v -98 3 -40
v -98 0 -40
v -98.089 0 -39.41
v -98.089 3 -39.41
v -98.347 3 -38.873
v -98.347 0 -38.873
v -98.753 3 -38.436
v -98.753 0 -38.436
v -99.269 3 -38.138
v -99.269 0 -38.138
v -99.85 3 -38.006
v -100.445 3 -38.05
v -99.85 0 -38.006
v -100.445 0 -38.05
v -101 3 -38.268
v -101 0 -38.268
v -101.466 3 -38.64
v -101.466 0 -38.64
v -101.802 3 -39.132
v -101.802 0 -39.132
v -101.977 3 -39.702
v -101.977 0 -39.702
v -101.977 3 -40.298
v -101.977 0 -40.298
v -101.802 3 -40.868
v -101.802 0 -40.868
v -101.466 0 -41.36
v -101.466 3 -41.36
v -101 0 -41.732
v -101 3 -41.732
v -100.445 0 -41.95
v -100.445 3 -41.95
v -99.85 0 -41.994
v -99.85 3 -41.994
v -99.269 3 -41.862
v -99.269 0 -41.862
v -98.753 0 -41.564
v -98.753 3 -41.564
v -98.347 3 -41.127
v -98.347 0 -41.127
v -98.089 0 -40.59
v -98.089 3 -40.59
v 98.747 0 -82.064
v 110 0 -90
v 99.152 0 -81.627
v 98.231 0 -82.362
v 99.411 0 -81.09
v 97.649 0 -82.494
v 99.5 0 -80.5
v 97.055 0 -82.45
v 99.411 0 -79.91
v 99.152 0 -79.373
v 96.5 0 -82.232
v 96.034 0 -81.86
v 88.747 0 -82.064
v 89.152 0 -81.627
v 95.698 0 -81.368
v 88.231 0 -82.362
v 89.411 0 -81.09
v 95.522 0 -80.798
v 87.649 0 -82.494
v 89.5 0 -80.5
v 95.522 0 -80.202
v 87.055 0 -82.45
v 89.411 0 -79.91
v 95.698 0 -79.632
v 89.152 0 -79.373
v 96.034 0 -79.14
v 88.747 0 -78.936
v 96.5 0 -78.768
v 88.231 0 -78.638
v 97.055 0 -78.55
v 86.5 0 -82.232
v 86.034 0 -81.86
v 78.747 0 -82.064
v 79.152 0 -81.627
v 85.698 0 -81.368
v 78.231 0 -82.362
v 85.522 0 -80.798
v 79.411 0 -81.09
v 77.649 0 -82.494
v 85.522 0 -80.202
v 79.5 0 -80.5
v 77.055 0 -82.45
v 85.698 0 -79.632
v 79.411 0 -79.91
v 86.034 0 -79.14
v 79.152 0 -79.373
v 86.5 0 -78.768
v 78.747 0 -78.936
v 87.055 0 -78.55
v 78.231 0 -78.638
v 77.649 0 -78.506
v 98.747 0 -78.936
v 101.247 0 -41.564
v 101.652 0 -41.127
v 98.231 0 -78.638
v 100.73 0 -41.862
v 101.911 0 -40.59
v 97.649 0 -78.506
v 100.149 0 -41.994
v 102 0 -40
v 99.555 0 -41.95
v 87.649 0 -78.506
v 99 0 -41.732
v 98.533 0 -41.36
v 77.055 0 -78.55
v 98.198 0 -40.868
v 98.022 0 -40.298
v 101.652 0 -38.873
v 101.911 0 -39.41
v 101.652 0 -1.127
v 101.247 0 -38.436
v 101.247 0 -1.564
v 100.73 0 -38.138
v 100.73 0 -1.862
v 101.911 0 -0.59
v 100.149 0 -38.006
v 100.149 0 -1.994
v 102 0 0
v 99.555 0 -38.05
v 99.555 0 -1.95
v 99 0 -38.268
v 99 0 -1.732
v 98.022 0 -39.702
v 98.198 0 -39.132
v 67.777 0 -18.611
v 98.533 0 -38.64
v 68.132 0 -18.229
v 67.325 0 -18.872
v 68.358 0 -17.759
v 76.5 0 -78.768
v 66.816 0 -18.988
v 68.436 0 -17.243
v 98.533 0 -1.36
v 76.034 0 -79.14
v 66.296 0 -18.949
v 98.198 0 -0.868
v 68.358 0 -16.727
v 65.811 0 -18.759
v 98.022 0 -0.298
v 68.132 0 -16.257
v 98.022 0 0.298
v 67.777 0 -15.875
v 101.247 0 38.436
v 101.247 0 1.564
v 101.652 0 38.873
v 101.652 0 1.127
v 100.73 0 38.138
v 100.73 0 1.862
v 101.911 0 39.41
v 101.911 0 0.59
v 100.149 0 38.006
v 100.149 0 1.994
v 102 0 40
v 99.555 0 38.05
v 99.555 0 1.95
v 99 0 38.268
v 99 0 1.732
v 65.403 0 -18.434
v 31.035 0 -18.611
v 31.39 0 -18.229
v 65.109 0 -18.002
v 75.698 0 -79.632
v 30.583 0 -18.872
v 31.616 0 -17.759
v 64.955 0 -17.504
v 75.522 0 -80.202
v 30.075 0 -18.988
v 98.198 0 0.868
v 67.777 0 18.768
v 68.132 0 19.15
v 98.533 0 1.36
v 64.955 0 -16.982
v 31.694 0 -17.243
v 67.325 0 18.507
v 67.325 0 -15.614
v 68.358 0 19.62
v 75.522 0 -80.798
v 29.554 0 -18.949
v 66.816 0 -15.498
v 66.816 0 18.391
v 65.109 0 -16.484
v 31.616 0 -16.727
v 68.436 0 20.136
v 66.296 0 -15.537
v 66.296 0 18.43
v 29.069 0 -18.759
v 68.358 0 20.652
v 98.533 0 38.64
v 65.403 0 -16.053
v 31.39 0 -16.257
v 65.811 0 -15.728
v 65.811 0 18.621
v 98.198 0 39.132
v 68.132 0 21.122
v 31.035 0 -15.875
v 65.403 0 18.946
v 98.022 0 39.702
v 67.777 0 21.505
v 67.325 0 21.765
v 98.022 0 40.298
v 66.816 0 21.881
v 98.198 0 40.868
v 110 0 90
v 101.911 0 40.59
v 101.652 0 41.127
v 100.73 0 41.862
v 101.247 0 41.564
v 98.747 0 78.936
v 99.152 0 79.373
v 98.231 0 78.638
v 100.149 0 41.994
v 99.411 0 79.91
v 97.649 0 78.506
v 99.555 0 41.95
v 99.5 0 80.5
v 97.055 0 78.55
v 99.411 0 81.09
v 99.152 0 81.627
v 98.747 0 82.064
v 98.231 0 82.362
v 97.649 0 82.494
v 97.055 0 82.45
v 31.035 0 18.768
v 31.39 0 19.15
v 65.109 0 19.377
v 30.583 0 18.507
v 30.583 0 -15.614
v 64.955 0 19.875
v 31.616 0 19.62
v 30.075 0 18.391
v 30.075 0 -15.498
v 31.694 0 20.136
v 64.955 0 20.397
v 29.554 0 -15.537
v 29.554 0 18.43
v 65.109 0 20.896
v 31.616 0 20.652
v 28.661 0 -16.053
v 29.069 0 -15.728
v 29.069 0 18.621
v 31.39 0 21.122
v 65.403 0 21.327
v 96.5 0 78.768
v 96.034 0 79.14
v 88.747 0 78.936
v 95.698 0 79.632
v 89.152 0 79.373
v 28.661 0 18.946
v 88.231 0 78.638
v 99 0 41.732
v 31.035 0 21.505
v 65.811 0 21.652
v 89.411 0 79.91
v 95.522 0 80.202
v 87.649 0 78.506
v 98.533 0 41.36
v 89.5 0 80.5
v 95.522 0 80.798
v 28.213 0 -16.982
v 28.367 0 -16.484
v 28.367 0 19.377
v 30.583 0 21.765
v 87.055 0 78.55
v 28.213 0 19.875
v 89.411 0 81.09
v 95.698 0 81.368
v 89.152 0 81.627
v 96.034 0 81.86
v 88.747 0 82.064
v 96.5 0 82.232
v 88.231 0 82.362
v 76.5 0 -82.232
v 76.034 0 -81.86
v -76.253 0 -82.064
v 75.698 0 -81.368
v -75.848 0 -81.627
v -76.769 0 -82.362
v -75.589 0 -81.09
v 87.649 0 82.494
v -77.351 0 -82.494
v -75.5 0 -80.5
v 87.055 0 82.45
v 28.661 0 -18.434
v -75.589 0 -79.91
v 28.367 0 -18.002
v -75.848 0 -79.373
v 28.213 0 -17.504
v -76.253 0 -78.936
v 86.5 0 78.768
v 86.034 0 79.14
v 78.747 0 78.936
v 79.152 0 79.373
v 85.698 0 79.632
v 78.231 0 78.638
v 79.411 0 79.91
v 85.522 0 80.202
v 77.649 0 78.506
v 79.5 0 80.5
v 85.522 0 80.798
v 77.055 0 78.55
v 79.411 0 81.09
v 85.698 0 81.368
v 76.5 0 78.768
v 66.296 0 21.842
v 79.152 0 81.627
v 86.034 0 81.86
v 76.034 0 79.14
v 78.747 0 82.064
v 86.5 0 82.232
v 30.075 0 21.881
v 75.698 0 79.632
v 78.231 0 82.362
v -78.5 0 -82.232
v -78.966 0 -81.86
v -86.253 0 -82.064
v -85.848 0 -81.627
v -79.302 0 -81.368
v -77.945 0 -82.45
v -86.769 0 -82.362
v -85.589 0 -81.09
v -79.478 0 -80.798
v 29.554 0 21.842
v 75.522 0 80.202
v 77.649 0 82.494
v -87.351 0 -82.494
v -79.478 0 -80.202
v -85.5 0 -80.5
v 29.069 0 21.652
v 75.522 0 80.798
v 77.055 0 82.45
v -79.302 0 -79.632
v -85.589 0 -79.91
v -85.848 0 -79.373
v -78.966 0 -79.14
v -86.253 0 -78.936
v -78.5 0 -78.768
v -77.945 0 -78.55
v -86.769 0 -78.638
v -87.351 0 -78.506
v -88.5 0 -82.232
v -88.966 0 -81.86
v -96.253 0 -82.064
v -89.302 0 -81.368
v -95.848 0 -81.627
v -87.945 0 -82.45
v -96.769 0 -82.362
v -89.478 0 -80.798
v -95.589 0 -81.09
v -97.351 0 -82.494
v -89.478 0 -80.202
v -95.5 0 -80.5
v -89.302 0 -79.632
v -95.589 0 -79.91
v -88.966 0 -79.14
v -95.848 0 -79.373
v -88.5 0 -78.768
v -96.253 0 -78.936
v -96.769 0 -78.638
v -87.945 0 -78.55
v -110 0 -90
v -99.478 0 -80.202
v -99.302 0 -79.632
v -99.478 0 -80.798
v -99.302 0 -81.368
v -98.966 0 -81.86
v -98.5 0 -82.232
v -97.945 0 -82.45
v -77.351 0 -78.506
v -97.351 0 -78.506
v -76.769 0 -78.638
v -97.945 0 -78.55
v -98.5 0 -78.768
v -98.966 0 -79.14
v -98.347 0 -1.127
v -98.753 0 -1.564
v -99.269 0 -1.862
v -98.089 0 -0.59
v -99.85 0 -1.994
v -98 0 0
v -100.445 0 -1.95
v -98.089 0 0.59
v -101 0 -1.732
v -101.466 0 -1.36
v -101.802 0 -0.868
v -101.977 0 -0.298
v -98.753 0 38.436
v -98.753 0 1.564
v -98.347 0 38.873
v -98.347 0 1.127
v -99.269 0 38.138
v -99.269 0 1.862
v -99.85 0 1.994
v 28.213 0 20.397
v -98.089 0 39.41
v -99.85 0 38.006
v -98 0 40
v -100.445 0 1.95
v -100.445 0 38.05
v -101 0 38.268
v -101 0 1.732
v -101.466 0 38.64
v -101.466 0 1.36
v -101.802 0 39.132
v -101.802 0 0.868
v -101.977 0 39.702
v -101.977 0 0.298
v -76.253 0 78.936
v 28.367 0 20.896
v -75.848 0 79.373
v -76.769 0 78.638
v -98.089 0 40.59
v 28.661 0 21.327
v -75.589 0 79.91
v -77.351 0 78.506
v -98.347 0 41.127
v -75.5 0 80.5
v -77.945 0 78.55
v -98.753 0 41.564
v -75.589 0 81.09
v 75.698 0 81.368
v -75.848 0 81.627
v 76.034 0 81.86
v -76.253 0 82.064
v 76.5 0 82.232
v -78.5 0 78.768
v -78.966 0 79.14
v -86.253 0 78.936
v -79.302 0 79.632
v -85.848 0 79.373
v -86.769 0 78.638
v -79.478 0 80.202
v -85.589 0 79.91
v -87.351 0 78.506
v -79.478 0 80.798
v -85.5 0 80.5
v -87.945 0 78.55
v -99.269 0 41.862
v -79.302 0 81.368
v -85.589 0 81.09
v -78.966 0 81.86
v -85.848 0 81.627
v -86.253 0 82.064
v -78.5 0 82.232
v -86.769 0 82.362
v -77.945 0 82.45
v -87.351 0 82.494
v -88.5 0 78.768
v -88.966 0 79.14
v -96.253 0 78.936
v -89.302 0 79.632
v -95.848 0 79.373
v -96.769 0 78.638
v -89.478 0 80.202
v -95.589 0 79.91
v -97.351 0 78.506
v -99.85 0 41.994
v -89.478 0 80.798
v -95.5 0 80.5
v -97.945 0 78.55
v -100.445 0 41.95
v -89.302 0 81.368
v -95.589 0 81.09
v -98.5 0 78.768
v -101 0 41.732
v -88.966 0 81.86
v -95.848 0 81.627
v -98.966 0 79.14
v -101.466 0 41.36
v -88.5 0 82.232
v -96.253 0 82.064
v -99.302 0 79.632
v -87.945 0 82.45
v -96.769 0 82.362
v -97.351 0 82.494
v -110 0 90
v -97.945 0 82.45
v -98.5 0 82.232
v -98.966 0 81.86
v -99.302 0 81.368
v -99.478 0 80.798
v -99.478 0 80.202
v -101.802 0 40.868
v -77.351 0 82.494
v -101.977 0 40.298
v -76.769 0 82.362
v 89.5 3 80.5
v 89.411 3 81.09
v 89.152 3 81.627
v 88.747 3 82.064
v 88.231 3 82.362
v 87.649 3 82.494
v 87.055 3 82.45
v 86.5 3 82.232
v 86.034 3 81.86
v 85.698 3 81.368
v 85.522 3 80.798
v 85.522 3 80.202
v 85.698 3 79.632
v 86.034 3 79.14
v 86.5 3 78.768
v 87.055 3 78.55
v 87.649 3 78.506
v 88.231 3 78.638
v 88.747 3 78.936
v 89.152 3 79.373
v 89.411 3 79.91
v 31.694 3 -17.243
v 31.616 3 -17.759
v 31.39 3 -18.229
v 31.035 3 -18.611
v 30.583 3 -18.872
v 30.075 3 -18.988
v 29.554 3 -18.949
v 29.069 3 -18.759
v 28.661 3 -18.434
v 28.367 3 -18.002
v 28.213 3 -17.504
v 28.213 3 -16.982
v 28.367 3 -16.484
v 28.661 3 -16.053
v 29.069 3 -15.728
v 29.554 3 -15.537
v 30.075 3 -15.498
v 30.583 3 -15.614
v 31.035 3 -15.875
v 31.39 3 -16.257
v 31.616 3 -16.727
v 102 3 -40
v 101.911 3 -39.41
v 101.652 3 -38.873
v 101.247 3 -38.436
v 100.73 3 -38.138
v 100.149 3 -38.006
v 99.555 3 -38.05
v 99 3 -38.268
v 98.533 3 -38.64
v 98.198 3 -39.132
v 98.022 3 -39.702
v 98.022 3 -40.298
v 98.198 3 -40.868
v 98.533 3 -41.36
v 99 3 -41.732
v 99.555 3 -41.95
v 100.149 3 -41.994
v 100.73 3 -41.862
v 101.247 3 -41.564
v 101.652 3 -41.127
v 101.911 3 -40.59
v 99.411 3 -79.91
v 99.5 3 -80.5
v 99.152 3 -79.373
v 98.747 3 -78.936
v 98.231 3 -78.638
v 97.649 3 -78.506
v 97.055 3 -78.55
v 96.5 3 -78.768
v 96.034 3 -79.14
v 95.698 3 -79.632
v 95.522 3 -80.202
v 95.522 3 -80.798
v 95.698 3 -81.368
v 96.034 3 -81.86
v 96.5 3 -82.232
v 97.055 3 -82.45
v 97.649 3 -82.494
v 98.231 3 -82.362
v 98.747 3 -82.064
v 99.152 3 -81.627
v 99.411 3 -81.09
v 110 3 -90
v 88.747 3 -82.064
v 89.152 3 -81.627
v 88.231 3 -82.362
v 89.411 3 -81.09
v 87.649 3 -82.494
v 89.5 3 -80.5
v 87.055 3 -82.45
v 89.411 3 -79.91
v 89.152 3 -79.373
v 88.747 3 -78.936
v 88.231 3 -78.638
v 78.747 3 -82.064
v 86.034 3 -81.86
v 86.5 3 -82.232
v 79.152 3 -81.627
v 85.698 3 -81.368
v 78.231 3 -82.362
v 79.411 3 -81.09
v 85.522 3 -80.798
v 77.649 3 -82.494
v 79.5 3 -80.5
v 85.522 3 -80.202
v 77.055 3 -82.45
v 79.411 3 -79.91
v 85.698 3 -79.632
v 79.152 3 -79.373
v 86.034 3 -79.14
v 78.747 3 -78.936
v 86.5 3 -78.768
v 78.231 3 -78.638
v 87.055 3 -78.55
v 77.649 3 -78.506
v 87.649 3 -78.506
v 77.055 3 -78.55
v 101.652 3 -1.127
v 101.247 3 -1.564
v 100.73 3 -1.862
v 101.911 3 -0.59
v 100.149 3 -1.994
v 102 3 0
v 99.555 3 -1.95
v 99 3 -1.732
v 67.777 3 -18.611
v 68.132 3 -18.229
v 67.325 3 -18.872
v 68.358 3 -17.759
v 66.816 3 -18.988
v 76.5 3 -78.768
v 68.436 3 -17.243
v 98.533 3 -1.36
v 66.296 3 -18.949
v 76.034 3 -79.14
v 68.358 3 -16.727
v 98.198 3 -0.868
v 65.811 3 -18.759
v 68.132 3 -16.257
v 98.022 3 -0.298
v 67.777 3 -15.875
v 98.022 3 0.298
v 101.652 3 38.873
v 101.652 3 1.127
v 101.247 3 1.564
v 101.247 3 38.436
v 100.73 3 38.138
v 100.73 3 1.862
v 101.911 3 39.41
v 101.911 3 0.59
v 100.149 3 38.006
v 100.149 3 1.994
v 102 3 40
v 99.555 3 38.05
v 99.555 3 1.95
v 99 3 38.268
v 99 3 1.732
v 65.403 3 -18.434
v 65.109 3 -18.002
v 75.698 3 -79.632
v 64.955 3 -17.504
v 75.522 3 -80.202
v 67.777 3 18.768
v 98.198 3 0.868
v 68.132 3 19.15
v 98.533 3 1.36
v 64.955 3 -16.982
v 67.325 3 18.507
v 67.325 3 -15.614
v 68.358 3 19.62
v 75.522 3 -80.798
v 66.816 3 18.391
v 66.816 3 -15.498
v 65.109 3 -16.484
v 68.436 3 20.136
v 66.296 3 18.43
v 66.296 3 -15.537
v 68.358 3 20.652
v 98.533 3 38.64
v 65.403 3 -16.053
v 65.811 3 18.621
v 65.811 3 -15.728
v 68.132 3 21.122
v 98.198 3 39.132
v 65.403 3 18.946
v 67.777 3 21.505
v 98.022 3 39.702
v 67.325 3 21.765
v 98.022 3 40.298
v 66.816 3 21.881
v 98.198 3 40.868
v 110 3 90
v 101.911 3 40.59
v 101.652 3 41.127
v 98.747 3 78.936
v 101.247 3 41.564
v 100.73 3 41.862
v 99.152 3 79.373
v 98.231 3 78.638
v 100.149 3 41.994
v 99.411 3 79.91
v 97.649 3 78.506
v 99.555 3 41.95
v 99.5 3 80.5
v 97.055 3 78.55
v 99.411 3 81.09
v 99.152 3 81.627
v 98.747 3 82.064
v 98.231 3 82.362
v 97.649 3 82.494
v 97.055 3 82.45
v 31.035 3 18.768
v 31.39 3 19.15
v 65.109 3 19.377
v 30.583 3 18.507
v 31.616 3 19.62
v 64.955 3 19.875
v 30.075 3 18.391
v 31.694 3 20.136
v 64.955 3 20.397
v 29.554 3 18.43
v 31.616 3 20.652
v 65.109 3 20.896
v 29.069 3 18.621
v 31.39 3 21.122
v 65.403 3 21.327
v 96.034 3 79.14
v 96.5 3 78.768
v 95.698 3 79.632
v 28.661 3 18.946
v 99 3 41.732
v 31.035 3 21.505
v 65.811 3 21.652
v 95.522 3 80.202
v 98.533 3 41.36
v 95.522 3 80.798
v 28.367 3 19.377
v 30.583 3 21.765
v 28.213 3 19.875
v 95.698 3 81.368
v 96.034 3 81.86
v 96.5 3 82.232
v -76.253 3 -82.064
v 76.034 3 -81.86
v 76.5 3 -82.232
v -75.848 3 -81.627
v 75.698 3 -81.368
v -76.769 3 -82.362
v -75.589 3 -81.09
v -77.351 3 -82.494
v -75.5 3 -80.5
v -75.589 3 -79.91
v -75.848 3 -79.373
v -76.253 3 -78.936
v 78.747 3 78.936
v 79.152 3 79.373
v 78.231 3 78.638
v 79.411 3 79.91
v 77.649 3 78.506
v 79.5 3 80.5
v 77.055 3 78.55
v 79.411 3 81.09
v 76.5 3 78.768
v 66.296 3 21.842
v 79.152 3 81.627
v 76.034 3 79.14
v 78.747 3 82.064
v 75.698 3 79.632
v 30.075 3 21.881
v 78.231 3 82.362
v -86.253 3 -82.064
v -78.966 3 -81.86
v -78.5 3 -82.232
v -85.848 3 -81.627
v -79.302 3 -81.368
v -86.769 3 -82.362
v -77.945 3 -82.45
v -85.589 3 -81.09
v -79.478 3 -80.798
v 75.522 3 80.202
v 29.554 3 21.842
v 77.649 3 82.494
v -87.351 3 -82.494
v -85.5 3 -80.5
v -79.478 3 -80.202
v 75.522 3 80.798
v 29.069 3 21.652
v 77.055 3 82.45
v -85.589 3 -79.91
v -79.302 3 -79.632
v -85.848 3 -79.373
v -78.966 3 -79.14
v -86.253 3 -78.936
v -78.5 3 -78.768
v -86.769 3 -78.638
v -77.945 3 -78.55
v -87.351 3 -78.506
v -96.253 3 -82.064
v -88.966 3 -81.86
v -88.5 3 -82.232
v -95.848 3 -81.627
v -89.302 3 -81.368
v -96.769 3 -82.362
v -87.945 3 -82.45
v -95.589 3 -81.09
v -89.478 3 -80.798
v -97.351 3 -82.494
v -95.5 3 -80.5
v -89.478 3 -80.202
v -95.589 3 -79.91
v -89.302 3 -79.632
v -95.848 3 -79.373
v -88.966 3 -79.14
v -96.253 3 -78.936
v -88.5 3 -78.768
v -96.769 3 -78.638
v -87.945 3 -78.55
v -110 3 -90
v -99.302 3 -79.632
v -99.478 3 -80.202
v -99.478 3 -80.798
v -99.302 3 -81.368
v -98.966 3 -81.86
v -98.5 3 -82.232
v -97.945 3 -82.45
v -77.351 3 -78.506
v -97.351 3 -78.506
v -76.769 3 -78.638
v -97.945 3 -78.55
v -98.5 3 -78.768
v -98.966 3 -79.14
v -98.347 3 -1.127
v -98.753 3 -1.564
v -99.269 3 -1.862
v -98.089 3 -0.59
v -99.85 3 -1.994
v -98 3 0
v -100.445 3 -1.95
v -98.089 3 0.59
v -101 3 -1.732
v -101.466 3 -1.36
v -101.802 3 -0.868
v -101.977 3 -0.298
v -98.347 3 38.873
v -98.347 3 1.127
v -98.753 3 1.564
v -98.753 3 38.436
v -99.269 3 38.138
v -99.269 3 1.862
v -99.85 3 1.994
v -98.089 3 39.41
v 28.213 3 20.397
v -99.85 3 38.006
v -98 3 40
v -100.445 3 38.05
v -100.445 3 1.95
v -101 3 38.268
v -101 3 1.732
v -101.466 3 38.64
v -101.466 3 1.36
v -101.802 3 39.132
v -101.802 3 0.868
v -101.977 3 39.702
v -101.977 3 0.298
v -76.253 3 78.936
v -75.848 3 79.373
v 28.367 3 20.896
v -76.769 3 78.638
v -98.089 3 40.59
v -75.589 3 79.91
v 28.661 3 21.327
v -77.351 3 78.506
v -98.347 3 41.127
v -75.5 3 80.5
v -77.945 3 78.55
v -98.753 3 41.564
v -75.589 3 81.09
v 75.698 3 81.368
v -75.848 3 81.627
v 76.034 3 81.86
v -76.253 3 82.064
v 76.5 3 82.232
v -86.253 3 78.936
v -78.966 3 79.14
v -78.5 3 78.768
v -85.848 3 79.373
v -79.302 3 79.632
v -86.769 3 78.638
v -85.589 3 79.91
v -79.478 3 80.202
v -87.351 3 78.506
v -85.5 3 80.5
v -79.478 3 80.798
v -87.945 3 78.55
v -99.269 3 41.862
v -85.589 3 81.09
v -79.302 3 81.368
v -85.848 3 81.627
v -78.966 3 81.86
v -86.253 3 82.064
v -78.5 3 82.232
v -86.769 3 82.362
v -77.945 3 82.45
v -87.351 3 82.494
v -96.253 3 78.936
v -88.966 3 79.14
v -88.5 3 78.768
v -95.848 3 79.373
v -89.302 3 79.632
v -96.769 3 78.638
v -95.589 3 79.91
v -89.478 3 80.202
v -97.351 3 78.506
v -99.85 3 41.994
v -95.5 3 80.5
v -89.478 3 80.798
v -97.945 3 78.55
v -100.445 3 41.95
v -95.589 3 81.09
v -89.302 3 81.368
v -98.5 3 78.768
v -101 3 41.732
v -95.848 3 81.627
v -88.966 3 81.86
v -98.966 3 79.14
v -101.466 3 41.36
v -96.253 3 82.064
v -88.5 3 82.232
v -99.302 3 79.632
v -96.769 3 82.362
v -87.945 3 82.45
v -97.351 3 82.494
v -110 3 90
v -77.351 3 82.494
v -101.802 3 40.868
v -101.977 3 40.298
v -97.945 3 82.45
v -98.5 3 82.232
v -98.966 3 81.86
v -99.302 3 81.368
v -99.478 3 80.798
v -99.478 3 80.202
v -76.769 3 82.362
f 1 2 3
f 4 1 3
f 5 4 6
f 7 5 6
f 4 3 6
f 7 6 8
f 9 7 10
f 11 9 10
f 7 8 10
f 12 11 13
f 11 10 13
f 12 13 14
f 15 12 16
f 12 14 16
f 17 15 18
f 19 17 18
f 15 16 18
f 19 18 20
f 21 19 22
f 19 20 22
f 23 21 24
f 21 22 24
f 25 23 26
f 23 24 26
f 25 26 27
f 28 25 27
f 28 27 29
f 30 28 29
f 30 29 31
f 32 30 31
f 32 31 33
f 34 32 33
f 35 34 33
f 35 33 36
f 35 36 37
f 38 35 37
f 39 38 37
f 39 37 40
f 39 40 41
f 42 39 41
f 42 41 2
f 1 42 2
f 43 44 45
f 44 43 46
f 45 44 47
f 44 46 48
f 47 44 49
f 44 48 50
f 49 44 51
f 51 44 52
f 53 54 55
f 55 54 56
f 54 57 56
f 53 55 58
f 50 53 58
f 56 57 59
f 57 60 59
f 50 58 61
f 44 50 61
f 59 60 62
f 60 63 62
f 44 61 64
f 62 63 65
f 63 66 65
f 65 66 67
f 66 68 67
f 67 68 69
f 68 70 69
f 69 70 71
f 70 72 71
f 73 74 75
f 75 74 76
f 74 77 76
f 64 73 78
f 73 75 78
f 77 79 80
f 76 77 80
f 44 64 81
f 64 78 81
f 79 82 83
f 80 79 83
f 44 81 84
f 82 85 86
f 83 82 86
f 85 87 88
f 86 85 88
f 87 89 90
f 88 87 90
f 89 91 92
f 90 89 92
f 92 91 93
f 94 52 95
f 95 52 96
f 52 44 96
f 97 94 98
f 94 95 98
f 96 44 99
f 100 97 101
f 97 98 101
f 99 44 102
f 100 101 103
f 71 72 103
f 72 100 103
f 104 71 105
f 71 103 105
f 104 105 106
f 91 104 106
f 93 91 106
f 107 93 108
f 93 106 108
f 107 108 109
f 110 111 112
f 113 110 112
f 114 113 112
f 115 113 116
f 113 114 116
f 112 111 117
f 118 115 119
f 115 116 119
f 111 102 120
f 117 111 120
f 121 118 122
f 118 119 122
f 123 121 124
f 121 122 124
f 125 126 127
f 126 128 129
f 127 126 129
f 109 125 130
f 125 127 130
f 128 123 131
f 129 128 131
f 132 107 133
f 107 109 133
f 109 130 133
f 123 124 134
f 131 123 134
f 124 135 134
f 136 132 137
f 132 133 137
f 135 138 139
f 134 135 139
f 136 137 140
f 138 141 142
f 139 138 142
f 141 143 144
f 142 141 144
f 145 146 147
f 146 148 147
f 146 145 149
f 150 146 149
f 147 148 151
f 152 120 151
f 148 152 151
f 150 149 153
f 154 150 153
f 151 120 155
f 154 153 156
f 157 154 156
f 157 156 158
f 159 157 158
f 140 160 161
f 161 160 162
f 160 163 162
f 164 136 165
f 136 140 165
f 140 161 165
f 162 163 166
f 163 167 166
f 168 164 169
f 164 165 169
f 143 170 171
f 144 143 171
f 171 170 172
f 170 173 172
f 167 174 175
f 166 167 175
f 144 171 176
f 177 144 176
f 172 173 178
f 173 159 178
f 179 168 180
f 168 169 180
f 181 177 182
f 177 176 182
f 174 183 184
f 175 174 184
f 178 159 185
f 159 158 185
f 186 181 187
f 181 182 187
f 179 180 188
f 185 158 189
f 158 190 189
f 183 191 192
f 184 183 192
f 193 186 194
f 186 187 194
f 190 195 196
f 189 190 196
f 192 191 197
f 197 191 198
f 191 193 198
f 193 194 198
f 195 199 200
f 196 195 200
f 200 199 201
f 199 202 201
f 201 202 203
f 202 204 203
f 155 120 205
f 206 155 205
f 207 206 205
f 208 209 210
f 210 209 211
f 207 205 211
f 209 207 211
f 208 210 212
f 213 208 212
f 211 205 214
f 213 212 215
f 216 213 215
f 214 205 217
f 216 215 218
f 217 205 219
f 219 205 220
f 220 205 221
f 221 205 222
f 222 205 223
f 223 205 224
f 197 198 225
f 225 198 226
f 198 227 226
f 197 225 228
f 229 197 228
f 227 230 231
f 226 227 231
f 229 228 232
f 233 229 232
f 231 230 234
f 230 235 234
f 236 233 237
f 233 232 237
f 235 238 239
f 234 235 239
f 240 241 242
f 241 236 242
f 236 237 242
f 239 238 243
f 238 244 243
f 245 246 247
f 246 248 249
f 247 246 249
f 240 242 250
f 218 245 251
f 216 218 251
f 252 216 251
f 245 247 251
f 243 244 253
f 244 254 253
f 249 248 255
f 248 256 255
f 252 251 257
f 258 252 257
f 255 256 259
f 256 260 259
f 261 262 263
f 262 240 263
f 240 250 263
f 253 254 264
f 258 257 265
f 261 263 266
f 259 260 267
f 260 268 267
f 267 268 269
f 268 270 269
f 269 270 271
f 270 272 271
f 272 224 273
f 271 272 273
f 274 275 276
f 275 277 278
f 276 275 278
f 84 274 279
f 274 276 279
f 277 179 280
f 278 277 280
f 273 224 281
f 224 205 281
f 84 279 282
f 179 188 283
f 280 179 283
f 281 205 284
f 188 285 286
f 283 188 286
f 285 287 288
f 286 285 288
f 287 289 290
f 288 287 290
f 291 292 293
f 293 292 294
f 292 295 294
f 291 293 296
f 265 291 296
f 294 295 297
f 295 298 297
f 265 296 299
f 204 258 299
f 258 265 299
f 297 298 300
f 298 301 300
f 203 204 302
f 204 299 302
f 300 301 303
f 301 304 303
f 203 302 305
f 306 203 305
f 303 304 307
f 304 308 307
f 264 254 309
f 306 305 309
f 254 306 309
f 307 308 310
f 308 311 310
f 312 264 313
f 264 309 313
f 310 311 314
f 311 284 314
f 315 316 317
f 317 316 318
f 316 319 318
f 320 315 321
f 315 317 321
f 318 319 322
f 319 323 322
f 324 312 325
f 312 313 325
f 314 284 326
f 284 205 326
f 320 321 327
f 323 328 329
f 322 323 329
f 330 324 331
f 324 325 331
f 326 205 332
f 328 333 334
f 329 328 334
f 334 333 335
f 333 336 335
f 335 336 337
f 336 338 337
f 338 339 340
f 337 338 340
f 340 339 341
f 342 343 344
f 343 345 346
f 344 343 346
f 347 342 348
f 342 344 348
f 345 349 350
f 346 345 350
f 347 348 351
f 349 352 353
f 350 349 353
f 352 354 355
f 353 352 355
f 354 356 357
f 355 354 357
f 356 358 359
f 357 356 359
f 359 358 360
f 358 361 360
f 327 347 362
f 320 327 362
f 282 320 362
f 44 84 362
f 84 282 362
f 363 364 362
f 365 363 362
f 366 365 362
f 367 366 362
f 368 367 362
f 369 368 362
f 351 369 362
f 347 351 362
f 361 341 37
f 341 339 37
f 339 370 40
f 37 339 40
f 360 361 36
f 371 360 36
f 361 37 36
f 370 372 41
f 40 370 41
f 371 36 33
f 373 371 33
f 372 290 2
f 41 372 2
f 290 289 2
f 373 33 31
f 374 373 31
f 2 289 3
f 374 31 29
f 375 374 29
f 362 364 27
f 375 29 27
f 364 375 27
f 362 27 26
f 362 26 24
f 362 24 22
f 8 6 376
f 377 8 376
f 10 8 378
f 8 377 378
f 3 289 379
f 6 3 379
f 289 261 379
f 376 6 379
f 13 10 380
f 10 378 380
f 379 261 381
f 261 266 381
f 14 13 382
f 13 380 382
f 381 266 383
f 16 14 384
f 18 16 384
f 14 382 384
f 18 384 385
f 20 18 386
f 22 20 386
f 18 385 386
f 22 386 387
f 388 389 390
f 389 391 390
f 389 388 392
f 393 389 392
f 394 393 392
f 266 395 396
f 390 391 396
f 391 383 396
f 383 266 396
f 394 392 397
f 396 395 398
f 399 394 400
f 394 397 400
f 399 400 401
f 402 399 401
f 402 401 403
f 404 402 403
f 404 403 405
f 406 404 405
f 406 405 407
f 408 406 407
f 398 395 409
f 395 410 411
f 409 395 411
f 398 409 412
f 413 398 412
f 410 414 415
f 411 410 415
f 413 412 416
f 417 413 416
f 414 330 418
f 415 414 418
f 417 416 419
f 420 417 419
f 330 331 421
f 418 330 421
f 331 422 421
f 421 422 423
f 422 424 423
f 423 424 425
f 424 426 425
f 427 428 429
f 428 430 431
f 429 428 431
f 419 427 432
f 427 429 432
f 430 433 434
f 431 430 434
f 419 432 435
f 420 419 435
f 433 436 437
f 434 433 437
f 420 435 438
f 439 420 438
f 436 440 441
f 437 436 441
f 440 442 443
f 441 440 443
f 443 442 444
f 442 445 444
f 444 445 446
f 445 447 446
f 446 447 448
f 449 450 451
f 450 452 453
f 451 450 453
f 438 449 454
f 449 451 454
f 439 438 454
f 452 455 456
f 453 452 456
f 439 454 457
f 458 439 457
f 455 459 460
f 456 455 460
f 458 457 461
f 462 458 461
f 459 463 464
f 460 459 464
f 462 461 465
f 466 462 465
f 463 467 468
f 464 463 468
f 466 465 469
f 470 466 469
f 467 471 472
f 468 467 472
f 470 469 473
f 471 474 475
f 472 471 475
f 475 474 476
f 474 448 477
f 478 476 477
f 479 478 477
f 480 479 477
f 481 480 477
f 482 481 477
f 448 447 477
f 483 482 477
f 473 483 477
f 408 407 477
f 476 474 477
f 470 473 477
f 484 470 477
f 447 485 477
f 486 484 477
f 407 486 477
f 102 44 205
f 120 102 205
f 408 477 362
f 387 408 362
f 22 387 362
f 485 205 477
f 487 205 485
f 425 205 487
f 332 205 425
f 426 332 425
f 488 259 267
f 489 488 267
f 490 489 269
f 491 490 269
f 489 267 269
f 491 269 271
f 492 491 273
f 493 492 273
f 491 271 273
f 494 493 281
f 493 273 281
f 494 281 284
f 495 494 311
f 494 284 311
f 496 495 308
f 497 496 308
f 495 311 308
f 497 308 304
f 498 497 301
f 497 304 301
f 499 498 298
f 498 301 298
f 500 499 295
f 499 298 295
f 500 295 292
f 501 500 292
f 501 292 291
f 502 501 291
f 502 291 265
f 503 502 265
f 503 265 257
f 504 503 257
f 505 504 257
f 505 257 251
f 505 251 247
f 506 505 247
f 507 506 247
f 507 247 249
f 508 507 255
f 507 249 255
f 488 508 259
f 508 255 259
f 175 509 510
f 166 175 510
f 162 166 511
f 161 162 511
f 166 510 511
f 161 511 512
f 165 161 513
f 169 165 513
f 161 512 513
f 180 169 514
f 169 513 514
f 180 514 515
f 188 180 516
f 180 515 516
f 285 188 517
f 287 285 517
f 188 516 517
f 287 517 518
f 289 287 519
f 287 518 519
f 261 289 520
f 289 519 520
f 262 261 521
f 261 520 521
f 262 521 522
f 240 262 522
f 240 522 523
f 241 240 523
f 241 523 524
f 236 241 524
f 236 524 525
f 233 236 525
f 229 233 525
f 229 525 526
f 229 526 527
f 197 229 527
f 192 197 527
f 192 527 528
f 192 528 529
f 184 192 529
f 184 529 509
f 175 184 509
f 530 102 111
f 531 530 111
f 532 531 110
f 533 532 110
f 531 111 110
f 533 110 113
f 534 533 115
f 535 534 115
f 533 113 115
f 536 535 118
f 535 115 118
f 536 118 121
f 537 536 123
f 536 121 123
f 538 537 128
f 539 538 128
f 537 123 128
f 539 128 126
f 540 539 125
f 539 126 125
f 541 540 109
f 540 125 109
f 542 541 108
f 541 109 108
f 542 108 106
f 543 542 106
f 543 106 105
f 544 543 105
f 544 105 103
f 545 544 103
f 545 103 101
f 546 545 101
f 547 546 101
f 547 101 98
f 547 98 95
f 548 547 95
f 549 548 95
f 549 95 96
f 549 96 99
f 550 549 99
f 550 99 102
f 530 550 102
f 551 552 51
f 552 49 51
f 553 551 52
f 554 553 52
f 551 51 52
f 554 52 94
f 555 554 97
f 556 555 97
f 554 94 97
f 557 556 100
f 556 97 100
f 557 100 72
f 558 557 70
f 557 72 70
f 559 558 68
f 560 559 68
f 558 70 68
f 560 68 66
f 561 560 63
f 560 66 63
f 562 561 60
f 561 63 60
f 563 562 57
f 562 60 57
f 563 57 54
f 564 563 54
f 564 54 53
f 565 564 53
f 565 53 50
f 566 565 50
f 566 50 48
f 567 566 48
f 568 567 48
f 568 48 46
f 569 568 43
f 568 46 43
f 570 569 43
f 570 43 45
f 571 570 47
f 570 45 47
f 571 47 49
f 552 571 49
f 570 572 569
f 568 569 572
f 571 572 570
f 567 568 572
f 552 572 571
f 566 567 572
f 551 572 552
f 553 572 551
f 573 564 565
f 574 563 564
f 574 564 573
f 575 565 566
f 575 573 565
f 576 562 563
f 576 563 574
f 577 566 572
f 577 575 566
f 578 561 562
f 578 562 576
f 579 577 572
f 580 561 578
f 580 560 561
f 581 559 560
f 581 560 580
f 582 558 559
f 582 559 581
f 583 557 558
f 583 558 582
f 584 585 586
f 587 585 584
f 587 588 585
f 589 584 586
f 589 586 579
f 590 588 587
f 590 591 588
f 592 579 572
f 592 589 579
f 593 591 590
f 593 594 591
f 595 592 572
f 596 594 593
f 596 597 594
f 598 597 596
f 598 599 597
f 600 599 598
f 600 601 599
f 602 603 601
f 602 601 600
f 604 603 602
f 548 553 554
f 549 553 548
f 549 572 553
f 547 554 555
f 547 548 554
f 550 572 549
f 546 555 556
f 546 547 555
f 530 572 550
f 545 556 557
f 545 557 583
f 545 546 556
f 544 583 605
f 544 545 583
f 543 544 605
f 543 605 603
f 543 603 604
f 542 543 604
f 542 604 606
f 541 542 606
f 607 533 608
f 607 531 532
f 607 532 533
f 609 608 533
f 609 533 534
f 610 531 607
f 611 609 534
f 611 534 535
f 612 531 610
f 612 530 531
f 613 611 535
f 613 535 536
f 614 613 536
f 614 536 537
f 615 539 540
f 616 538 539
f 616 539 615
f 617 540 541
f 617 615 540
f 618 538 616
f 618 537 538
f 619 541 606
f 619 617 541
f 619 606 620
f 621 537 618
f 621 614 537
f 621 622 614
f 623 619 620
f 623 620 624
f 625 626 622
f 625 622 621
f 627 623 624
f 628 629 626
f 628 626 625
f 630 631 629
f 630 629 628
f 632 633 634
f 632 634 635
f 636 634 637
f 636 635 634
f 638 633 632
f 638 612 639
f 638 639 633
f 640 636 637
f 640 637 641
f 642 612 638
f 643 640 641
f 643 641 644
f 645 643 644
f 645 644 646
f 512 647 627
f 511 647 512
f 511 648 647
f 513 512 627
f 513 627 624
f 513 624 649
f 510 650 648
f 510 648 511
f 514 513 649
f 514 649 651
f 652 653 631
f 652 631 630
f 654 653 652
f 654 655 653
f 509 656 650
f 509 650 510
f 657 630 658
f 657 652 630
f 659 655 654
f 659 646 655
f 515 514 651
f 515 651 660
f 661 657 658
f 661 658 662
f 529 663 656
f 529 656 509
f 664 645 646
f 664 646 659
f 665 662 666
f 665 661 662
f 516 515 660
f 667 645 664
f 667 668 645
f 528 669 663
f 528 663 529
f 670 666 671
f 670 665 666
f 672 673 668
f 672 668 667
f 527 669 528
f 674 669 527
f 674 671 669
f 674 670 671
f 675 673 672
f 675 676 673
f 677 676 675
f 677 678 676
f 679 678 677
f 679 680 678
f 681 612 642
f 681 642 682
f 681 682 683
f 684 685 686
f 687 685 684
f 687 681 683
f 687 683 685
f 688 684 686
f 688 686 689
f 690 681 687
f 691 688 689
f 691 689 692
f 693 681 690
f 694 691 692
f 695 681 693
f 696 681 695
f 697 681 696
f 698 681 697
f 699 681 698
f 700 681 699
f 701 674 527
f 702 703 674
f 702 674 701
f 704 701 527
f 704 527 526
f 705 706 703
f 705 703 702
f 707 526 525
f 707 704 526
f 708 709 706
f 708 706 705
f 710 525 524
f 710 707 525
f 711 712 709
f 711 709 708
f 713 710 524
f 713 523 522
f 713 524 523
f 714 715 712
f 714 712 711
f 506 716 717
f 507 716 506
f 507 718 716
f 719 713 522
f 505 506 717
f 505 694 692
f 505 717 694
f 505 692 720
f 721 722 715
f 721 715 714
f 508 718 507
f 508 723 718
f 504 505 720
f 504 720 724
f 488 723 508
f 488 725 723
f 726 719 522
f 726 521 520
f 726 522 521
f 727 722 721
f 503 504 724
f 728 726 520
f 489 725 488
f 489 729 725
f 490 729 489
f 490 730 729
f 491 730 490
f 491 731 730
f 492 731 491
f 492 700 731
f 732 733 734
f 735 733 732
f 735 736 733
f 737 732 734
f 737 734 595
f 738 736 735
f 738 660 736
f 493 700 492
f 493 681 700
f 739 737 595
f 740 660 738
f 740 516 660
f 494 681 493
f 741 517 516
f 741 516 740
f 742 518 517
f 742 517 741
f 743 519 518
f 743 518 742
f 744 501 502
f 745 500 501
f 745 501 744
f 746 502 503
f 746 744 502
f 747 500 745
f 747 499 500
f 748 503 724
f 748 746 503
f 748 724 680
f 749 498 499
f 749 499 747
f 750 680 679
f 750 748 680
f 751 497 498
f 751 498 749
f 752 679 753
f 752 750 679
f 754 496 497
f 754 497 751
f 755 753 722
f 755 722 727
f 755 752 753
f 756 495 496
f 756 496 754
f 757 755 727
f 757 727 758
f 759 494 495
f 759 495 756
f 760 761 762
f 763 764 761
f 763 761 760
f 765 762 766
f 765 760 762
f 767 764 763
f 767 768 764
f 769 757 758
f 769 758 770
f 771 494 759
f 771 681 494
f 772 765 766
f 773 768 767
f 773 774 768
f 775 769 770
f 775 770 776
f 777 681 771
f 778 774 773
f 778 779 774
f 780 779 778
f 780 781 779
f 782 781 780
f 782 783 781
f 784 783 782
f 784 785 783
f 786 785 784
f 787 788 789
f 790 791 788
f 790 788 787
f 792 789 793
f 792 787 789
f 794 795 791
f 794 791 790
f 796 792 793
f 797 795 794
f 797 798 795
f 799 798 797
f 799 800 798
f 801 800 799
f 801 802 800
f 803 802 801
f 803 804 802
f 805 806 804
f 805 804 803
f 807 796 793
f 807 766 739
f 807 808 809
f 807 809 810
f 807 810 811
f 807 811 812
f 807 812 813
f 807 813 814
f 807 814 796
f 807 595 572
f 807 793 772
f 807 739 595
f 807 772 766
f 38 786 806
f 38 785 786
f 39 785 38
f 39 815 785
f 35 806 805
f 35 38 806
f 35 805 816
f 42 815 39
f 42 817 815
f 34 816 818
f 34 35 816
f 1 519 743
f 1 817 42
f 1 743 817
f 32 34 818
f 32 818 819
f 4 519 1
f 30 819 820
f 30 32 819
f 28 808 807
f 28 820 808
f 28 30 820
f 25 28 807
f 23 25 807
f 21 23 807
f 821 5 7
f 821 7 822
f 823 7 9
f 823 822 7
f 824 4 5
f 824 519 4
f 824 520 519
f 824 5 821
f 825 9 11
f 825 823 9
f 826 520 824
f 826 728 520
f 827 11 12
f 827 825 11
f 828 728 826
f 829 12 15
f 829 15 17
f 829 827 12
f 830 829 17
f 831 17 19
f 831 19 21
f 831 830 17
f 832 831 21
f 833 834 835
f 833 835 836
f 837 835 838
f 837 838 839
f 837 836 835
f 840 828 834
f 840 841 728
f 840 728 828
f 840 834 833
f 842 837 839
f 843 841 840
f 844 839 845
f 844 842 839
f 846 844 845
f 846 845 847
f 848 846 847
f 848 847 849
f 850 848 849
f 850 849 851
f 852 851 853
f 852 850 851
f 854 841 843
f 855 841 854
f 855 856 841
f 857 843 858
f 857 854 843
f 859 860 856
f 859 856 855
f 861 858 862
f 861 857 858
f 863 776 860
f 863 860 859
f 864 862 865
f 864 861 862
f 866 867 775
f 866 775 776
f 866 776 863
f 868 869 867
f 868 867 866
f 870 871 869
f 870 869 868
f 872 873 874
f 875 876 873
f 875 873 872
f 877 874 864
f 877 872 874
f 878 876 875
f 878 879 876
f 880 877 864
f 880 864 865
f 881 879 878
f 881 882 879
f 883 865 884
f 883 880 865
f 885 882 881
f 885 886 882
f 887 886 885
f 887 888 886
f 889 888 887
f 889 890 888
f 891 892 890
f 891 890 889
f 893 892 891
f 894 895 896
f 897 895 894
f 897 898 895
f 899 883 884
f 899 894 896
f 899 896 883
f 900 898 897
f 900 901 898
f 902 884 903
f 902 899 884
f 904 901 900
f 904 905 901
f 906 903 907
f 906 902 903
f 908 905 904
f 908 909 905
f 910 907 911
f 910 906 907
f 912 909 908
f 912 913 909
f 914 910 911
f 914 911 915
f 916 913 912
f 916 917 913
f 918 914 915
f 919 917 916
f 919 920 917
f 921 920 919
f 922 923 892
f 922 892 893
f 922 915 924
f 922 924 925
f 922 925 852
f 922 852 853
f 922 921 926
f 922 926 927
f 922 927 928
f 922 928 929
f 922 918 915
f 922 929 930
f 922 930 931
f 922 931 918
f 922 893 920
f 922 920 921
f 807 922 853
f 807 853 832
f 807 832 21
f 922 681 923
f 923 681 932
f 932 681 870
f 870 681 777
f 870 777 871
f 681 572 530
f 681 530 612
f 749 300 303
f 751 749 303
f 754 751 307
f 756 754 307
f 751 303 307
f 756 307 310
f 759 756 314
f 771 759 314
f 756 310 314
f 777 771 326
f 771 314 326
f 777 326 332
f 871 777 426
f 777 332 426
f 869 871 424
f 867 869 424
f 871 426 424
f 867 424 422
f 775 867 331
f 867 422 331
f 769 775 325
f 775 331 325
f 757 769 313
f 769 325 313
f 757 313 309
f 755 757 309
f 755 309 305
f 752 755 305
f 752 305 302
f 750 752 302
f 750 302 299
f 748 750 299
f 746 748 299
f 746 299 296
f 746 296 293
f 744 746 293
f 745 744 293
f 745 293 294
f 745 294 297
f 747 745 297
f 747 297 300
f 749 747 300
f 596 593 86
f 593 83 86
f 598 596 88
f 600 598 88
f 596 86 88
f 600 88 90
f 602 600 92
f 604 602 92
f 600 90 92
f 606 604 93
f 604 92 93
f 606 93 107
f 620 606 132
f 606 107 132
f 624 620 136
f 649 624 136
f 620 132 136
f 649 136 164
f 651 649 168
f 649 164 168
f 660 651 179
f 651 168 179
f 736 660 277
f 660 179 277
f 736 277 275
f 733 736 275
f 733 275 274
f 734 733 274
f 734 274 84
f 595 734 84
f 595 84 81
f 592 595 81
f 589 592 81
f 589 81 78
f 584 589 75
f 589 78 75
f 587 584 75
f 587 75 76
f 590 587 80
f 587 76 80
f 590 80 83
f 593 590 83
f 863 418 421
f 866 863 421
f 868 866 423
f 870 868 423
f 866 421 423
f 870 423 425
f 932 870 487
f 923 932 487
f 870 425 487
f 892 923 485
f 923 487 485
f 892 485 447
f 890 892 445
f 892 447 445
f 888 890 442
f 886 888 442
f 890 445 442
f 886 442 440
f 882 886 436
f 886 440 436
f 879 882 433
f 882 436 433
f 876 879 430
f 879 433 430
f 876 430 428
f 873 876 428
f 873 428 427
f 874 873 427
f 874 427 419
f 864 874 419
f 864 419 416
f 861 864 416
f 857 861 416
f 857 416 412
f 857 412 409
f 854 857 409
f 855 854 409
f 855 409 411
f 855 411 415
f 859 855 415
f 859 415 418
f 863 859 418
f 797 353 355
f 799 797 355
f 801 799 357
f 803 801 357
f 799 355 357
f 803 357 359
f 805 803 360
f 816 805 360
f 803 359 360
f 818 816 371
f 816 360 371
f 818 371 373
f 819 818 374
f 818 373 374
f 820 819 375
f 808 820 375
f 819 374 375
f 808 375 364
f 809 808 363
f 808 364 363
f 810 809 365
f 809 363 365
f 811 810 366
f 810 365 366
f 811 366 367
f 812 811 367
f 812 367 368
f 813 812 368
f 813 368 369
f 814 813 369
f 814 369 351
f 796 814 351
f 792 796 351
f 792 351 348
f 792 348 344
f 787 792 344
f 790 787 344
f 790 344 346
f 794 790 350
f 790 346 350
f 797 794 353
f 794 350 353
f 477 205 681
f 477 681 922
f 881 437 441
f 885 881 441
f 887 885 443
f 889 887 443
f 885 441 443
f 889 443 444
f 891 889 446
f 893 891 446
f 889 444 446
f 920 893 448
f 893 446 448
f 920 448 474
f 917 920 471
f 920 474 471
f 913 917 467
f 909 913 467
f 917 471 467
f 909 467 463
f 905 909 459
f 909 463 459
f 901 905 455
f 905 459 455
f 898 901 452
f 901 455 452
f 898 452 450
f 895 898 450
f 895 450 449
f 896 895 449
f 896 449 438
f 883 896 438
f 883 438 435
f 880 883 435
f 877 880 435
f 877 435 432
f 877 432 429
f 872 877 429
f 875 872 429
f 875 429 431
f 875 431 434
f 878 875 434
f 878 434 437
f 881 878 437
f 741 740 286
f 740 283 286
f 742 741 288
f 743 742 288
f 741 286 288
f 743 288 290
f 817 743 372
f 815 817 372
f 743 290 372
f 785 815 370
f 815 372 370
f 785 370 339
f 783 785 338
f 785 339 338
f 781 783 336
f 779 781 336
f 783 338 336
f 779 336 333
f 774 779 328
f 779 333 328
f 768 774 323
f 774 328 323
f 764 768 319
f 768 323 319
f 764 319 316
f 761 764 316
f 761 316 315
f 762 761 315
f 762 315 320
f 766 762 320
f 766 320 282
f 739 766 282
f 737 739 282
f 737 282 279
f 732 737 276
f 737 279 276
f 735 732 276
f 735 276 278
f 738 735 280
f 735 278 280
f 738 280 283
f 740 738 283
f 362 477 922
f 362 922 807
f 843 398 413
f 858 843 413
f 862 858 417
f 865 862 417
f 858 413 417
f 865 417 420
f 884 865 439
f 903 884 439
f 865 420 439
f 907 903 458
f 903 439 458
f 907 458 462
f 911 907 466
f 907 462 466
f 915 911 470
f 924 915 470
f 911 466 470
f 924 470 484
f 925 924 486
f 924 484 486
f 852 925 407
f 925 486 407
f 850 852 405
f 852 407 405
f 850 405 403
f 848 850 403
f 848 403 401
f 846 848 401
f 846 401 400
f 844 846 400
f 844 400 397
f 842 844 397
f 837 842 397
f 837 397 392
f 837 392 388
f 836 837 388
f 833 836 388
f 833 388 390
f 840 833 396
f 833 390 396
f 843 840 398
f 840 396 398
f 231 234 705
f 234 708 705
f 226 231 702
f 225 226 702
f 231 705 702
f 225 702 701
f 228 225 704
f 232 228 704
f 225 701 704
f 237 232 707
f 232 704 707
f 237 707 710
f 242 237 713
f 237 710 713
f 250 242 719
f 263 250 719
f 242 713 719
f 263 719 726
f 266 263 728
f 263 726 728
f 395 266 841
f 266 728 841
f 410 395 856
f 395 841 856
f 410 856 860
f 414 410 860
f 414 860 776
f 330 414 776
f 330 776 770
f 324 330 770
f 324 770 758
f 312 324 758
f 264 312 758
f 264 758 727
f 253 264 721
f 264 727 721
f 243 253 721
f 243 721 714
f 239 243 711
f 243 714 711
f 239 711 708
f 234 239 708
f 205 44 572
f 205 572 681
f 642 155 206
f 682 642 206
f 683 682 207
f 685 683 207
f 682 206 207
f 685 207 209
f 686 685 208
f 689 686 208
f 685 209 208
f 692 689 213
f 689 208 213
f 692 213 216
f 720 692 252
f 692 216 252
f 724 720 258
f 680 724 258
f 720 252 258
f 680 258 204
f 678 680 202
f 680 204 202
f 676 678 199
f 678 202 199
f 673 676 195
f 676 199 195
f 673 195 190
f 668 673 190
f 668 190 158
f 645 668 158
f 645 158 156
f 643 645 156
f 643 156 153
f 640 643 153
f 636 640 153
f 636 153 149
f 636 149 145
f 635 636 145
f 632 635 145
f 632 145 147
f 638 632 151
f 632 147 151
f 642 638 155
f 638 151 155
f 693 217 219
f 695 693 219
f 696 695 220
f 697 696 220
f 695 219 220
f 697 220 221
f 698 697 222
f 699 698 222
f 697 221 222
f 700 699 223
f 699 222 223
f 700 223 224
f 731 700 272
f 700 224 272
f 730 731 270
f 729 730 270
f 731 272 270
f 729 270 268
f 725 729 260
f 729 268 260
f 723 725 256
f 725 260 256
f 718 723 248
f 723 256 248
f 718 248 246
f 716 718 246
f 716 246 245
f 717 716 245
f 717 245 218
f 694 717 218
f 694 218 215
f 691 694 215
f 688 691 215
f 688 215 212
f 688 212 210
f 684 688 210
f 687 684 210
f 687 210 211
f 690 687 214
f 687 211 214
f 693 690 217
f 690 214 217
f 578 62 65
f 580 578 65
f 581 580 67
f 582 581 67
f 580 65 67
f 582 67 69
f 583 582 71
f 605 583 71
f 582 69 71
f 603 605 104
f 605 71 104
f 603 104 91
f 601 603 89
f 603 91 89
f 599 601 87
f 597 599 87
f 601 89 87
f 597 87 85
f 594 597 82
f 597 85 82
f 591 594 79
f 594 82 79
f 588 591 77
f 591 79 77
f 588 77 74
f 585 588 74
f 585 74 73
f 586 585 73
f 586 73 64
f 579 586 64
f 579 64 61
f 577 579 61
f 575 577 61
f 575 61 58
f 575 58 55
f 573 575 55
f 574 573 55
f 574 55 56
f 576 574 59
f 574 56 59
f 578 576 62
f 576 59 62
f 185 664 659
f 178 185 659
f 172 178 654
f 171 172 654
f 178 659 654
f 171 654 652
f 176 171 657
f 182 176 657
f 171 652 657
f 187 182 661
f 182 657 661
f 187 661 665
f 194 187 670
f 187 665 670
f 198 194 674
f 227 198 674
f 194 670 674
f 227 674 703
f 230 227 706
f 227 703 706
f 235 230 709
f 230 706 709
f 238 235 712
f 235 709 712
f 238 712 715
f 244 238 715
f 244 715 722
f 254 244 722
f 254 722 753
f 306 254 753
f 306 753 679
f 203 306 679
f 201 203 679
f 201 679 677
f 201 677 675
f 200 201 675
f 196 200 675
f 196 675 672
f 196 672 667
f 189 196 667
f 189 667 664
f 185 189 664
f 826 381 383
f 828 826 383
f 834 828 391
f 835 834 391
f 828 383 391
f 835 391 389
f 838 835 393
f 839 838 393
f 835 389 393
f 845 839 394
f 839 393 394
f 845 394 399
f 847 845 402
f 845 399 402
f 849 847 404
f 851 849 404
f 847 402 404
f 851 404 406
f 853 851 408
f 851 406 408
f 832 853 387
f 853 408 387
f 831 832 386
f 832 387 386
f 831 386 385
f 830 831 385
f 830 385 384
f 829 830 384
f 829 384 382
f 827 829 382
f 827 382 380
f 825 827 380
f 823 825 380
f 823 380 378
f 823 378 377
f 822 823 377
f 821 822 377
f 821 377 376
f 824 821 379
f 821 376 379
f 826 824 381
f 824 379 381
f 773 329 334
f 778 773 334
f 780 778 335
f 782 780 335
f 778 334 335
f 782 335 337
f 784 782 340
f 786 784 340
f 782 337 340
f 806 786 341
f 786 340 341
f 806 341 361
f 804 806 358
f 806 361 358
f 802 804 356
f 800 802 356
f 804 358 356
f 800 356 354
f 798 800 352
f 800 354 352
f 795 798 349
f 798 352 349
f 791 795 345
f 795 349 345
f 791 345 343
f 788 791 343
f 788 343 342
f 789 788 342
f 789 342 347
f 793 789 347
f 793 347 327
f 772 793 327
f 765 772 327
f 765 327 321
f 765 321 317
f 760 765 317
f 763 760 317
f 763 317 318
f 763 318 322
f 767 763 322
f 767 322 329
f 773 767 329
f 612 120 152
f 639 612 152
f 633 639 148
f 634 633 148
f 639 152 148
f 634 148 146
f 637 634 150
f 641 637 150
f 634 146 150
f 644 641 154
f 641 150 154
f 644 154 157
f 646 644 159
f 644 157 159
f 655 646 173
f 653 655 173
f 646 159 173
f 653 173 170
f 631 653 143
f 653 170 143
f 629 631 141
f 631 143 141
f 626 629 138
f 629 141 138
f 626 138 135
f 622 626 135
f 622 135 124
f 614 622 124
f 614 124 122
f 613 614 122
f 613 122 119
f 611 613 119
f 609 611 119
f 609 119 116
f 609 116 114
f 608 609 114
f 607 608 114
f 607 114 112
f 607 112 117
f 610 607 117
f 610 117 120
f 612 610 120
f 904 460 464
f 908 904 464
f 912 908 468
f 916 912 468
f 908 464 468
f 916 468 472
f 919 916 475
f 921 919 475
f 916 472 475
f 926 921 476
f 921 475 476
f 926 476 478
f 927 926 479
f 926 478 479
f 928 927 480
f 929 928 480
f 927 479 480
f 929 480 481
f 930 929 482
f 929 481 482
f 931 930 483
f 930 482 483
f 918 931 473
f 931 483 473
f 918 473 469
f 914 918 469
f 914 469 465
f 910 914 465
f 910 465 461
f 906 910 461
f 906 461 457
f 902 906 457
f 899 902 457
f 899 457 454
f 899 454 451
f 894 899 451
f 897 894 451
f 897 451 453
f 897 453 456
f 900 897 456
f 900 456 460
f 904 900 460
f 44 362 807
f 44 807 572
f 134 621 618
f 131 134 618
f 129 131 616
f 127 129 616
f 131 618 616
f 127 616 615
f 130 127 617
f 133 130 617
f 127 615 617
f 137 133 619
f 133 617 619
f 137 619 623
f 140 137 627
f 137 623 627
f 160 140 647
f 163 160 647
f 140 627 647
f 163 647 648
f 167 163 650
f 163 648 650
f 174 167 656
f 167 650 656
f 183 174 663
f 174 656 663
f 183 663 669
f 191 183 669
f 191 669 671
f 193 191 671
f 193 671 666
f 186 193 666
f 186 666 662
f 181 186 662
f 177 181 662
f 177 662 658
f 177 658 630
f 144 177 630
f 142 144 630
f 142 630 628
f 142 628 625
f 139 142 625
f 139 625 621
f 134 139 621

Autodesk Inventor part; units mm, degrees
ref_plane "YZ Plane" through (0, 0, 0) normal (1, 0, 0) x (0, 1, 0)
ref_plane "XZ Plane" through (0, 0, 0) normal (0, 1, 0) x (-1, 0, 0)
ref_plane "XY Plane" through (0, 0, 0) normal (0, 0, 1) x (1, 0, 0)
sketch "Эскиз1" plane through (0, 0, 0) normal (0, 1, 0) x (-1, 0, 0)
  line L0 (-110, 90) -> (110, 90)
  line L1 (110, 90) -> (110, -90)
  line L2 (110, -90) -> (-110, -90)
  line L3 (-110, -90) -> (-110, 90)
  line L4 (-110, 90) -> (110, -90) construction
  line L5 (110, 90) -> (-110, -90) construction
  point P0 (0, 0)
  dimension "d0" = 220
  dimension "d1" = 180
extrude "Выдавливание1" add sketch "Эскиз1" along normal blind 3
sketch "Эскиз4" plane through (0, 0, 0) normal (0, -1, 0) x (1, 0, 0)
  circle A0 centre (99.9996, -40) radius 2 projected
  circle A1 centre (99.9996, 0) radius 2 projected
  circle A2 centre (99.9996, 40) radius 2 projected
  circle A3 centre (-99.9997, 0) radius 2 projected
  circle A4 centre (-99.9997, -40) radius 2 projected
  circle A5 centre (-99.9997, 40) radius 2 projected
  point P0 (0, 0)
extrude "Выдавливание4" cut sketch "Эскиз4" against normal blind 3
sketch "Эскиз5" plane through (0, 0, 0) normal (0, -1, 0) x (1, 0, 0)
  circle A0 centre (-97.5, 80.5) radius 2 projected
  circle A1 centre (-87.5, 80.5) radius 2 projected
  circle A2 centre (-77.5, 80.5) radius 2 projected
  circle A3 centre (-97.5, -80.5) radius 2 projected
  circle A4 centre (-87.5, -80.5) radius 2 projected
  circle A5 centre (-77.5, -80.5) radius 2 projected
  circle A6 centre (77.5, -80.5) radius 2 projected
  circle A7 centre (87.5, -80.5) radius 2 projected
  circle A8 centre (97.5, -80.5) radius 2 projected
  circle A9 centre (87.5, 80.5) radius 2 projected
  circle A10 centre (97.5, 80.5) radius 2 projected
  circle A11 centre (77.5, 80.5) radius 2 projected
  point P0 (0, 0)
extrude "Выдавливание5" cut sketch "Эскиз5" against normal blind 10
sketch "Эскиз6" plane through (0, 3, 0) normal (0, 1, 0) x (1, 0, 0)
  circle A0 centre (66.6857, -20.1363) radius 1.75 projected
  circle A1 centre (29.9439, -20.1363) radius 1.75 projected
  circle A2 centre (29.9439, 17.2432) radius 1.75 projected
  circle A3 centre (66.6857, 17.2432) radius 1.75 projected
  point P0 (0, 0)
extrude "Выдавливание6" cut sketch "Эскиз6" against normal blind 10
properties part number "000.001 - Bottom"
